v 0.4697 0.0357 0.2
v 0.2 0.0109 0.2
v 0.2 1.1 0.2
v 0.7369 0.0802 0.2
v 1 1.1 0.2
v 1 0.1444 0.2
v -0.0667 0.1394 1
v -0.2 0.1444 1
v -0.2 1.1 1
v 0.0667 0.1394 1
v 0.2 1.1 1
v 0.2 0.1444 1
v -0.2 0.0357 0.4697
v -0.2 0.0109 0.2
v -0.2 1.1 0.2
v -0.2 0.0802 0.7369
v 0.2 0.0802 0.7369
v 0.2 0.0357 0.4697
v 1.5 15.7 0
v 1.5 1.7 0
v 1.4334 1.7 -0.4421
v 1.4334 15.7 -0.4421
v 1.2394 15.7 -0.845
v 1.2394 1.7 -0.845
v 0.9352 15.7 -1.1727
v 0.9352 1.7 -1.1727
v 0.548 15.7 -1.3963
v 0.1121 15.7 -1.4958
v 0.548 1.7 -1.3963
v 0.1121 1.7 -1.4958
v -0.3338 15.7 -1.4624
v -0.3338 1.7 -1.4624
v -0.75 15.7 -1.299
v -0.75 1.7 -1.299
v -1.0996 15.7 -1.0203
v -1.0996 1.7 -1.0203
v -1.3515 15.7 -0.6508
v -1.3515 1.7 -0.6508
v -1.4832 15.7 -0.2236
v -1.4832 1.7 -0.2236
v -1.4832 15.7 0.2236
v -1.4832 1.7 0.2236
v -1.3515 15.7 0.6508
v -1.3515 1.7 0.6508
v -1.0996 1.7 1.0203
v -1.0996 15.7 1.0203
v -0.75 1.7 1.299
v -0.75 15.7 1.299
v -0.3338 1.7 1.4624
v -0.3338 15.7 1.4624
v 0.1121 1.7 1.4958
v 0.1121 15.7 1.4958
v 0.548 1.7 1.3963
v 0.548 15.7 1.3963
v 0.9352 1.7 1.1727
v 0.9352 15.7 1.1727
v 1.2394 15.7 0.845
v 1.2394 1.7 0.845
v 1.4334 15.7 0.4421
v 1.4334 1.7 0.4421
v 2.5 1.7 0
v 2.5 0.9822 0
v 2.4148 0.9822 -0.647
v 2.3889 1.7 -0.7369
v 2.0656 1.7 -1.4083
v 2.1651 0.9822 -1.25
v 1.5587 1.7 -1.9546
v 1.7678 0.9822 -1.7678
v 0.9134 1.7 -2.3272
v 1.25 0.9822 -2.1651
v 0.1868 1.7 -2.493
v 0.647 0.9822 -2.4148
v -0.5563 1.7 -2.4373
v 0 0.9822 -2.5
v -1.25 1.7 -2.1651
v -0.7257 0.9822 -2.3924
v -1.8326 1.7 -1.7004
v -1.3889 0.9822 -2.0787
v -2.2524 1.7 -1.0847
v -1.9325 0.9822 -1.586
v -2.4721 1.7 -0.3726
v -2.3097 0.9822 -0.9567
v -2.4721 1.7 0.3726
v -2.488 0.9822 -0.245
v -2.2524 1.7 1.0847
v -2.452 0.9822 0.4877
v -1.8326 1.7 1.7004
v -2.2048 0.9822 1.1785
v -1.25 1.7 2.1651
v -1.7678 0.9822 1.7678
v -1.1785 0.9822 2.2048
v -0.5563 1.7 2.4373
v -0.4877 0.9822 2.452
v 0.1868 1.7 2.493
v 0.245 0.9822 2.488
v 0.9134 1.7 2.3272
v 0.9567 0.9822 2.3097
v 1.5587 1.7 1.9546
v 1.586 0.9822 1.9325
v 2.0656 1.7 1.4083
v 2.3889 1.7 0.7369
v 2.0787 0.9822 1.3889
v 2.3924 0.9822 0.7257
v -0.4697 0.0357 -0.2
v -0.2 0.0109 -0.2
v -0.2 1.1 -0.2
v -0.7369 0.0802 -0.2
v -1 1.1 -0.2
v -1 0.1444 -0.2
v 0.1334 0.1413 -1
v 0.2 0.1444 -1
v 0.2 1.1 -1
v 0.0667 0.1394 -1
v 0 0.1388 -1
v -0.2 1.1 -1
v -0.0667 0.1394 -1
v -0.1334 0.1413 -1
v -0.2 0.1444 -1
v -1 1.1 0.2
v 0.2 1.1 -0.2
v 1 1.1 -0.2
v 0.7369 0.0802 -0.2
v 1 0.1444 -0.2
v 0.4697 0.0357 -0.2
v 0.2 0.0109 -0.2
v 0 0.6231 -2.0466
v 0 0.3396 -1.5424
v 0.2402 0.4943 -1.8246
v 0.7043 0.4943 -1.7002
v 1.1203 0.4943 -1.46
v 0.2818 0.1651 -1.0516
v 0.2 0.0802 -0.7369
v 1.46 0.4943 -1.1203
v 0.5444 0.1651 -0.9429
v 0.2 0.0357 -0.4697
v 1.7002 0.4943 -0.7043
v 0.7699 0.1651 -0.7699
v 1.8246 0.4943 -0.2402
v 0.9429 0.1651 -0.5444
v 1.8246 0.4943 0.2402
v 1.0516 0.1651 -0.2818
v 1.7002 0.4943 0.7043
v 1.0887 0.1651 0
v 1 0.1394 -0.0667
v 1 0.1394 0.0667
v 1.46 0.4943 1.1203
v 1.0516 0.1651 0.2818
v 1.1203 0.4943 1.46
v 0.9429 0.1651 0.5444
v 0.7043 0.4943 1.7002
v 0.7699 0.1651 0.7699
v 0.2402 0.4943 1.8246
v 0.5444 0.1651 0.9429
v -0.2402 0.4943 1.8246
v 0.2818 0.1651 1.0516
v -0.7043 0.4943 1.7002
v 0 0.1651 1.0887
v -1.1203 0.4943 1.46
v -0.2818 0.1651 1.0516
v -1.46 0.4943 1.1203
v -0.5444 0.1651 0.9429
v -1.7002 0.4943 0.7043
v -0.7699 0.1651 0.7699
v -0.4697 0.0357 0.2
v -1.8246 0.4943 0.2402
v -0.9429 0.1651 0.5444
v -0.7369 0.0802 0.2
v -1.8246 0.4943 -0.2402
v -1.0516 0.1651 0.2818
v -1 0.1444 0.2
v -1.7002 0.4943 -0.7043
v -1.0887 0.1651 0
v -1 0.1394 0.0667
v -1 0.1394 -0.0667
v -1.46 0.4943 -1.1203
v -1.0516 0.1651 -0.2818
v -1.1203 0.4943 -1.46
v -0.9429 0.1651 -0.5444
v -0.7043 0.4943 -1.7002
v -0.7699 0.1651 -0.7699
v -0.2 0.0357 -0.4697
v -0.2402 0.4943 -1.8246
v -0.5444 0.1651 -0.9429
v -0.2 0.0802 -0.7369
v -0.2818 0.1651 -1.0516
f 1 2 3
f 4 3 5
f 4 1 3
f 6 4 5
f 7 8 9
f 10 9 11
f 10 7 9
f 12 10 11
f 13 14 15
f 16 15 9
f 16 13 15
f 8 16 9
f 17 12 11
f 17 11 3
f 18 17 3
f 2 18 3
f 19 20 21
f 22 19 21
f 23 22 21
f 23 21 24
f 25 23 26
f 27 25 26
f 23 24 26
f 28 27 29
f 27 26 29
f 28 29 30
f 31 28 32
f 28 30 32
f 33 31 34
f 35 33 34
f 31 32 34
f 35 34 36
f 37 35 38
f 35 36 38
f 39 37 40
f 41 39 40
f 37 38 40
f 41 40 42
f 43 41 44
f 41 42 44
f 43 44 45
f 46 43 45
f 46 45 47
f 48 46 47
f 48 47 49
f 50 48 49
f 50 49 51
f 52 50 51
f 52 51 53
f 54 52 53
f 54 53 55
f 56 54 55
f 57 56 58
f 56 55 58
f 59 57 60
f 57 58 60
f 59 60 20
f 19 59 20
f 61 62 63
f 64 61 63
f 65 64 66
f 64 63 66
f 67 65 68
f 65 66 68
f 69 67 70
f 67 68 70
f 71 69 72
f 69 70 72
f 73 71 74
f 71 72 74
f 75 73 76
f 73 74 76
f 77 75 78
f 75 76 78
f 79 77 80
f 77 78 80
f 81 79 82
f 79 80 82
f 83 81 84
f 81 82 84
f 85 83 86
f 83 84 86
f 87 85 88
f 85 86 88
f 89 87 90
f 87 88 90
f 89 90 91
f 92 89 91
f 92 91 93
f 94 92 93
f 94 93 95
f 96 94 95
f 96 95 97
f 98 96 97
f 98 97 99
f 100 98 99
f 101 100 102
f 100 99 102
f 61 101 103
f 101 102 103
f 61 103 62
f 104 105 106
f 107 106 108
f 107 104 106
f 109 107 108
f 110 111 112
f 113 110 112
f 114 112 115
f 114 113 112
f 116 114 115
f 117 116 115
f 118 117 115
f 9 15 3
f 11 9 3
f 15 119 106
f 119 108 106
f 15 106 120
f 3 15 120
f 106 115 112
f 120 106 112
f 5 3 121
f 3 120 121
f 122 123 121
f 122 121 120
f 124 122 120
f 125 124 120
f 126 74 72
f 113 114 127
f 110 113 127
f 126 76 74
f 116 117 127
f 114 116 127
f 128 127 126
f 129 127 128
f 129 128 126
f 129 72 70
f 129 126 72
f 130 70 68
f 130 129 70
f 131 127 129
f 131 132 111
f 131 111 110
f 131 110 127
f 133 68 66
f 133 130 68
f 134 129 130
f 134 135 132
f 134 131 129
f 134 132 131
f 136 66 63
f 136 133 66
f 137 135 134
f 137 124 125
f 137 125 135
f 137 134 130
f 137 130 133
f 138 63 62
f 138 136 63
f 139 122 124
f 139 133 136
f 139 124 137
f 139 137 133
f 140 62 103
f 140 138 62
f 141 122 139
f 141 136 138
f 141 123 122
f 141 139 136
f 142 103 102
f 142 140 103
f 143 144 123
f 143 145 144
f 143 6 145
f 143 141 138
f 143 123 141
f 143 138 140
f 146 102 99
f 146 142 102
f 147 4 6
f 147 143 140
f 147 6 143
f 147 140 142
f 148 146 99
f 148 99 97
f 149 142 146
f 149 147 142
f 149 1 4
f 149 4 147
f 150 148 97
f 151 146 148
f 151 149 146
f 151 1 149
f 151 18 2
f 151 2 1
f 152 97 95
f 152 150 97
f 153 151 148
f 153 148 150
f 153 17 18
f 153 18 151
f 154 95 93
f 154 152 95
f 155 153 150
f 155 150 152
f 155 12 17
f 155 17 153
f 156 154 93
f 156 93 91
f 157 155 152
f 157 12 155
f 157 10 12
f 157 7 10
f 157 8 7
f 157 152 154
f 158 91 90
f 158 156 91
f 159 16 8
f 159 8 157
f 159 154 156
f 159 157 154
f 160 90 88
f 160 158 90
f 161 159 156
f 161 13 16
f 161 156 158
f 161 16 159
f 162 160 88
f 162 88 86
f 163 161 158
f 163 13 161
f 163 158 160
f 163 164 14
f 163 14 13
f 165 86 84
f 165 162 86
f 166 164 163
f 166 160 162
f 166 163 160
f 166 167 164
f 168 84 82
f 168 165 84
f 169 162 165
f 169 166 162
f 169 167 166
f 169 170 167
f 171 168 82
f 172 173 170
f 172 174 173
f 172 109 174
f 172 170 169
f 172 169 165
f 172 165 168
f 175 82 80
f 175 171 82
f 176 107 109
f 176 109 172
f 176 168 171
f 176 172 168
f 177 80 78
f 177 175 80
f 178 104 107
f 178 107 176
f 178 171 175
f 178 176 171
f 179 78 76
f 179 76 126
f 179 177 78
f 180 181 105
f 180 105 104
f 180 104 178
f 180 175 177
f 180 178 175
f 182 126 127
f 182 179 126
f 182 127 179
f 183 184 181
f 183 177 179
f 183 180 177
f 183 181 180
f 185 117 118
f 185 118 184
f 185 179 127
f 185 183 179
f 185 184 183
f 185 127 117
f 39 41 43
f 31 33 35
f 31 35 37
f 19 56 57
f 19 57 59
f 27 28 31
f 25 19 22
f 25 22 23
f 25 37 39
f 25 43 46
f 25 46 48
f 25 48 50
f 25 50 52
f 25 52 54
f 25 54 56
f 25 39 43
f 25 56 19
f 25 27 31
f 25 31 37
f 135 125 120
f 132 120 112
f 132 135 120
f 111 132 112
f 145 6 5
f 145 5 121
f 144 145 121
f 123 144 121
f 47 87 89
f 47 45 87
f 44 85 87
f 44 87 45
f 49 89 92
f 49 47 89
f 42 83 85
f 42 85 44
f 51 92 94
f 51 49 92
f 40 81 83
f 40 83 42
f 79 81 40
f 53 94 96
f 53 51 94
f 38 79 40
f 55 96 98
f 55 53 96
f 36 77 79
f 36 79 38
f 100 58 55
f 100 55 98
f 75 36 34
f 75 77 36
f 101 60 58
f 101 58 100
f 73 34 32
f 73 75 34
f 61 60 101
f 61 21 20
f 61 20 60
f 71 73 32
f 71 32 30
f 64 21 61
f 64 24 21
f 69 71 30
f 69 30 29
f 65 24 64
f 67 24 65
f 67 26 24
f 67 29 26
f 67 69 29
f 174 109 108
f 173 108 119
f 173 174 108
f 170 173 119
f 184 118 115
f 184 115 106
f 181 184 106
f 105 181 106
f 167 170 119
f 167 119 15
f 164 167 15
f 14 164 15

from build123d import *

# Parameters (mm, degrees)
SKETCH_1_R          = 2.5
EXTRUDE_1_DEPTH     = 1.7
SKETCH_2_R          = 1.5
EXTRUDE_2_DEPTH     = 14
CUT_EXTRUDE_1_DEPTH = 6.1


with BuildPart() as part:
    # 草图1 → 凸台-拉伸1 (new body)
    with BuildSketch(Plane(origin=(0, 0, 0), x_dir=(1, 0, 0), z_dir=(0, 1, 0))):
        Circle(SKETCH_1_R)
    extrude(amount=EXTRUDE_1_DEPTH)

    # 草图2 → 凸台-拉伸2 (add)
    with BuildSketch(Plane(origin=(0, 1.7, 0), x_dir=(1, 0, 0), z_dir=(0, 1, 0))):
        Circle(SKETCH_2_R)
    extrude(amount=EXTRUDE_2_DEPTH)

    # 草图3 one side → 切除-旋转3 (revolve, cut)
    with BuildSketch(Plane(origin=(0, 0, 0), x_dir=(0, 0, -1), z_dir=(1, 0, 0))):
        with BuildLine():
            ThreePointArc((2.5, 0.982204858), (1.343012135, 0.254359211), (0, 0))
            Line((0, 0), (0, -0.936416285))
            Line((0, -0.936416285), (3.543500435, -0.936416285))
            Line((3.543500435, -0.936416285), (2.5, 0.982204858))
        make_face()
    revolve(axis=Axis((0, 1.035939113, 0), (0, -1, 0)), mode=Mode.SUBTRACT)

    # 草图4 → 切除-拉伸1 (cut)
    with BuildSketch(Plane(origin=(0, -5, 0), x_dir=(1, 0, 0), z_dir=(0, 1, 0))):
        Polygon((-1, -0.2), (-0.2, -0.2), (-0.2, -1), (0.2, -1), (0.2, -0.2), (1, -0.2), (1, 0.2), (0.2, 0.2), (0.2, 1), (-0.2, 1), (-0.2, 0.2), (-1, 0.2), align=None)
    extrude(amount=CUT_EXTRUDE_1_DEPTH, mode=Mode.SUBTRACT)


solid = part.part
